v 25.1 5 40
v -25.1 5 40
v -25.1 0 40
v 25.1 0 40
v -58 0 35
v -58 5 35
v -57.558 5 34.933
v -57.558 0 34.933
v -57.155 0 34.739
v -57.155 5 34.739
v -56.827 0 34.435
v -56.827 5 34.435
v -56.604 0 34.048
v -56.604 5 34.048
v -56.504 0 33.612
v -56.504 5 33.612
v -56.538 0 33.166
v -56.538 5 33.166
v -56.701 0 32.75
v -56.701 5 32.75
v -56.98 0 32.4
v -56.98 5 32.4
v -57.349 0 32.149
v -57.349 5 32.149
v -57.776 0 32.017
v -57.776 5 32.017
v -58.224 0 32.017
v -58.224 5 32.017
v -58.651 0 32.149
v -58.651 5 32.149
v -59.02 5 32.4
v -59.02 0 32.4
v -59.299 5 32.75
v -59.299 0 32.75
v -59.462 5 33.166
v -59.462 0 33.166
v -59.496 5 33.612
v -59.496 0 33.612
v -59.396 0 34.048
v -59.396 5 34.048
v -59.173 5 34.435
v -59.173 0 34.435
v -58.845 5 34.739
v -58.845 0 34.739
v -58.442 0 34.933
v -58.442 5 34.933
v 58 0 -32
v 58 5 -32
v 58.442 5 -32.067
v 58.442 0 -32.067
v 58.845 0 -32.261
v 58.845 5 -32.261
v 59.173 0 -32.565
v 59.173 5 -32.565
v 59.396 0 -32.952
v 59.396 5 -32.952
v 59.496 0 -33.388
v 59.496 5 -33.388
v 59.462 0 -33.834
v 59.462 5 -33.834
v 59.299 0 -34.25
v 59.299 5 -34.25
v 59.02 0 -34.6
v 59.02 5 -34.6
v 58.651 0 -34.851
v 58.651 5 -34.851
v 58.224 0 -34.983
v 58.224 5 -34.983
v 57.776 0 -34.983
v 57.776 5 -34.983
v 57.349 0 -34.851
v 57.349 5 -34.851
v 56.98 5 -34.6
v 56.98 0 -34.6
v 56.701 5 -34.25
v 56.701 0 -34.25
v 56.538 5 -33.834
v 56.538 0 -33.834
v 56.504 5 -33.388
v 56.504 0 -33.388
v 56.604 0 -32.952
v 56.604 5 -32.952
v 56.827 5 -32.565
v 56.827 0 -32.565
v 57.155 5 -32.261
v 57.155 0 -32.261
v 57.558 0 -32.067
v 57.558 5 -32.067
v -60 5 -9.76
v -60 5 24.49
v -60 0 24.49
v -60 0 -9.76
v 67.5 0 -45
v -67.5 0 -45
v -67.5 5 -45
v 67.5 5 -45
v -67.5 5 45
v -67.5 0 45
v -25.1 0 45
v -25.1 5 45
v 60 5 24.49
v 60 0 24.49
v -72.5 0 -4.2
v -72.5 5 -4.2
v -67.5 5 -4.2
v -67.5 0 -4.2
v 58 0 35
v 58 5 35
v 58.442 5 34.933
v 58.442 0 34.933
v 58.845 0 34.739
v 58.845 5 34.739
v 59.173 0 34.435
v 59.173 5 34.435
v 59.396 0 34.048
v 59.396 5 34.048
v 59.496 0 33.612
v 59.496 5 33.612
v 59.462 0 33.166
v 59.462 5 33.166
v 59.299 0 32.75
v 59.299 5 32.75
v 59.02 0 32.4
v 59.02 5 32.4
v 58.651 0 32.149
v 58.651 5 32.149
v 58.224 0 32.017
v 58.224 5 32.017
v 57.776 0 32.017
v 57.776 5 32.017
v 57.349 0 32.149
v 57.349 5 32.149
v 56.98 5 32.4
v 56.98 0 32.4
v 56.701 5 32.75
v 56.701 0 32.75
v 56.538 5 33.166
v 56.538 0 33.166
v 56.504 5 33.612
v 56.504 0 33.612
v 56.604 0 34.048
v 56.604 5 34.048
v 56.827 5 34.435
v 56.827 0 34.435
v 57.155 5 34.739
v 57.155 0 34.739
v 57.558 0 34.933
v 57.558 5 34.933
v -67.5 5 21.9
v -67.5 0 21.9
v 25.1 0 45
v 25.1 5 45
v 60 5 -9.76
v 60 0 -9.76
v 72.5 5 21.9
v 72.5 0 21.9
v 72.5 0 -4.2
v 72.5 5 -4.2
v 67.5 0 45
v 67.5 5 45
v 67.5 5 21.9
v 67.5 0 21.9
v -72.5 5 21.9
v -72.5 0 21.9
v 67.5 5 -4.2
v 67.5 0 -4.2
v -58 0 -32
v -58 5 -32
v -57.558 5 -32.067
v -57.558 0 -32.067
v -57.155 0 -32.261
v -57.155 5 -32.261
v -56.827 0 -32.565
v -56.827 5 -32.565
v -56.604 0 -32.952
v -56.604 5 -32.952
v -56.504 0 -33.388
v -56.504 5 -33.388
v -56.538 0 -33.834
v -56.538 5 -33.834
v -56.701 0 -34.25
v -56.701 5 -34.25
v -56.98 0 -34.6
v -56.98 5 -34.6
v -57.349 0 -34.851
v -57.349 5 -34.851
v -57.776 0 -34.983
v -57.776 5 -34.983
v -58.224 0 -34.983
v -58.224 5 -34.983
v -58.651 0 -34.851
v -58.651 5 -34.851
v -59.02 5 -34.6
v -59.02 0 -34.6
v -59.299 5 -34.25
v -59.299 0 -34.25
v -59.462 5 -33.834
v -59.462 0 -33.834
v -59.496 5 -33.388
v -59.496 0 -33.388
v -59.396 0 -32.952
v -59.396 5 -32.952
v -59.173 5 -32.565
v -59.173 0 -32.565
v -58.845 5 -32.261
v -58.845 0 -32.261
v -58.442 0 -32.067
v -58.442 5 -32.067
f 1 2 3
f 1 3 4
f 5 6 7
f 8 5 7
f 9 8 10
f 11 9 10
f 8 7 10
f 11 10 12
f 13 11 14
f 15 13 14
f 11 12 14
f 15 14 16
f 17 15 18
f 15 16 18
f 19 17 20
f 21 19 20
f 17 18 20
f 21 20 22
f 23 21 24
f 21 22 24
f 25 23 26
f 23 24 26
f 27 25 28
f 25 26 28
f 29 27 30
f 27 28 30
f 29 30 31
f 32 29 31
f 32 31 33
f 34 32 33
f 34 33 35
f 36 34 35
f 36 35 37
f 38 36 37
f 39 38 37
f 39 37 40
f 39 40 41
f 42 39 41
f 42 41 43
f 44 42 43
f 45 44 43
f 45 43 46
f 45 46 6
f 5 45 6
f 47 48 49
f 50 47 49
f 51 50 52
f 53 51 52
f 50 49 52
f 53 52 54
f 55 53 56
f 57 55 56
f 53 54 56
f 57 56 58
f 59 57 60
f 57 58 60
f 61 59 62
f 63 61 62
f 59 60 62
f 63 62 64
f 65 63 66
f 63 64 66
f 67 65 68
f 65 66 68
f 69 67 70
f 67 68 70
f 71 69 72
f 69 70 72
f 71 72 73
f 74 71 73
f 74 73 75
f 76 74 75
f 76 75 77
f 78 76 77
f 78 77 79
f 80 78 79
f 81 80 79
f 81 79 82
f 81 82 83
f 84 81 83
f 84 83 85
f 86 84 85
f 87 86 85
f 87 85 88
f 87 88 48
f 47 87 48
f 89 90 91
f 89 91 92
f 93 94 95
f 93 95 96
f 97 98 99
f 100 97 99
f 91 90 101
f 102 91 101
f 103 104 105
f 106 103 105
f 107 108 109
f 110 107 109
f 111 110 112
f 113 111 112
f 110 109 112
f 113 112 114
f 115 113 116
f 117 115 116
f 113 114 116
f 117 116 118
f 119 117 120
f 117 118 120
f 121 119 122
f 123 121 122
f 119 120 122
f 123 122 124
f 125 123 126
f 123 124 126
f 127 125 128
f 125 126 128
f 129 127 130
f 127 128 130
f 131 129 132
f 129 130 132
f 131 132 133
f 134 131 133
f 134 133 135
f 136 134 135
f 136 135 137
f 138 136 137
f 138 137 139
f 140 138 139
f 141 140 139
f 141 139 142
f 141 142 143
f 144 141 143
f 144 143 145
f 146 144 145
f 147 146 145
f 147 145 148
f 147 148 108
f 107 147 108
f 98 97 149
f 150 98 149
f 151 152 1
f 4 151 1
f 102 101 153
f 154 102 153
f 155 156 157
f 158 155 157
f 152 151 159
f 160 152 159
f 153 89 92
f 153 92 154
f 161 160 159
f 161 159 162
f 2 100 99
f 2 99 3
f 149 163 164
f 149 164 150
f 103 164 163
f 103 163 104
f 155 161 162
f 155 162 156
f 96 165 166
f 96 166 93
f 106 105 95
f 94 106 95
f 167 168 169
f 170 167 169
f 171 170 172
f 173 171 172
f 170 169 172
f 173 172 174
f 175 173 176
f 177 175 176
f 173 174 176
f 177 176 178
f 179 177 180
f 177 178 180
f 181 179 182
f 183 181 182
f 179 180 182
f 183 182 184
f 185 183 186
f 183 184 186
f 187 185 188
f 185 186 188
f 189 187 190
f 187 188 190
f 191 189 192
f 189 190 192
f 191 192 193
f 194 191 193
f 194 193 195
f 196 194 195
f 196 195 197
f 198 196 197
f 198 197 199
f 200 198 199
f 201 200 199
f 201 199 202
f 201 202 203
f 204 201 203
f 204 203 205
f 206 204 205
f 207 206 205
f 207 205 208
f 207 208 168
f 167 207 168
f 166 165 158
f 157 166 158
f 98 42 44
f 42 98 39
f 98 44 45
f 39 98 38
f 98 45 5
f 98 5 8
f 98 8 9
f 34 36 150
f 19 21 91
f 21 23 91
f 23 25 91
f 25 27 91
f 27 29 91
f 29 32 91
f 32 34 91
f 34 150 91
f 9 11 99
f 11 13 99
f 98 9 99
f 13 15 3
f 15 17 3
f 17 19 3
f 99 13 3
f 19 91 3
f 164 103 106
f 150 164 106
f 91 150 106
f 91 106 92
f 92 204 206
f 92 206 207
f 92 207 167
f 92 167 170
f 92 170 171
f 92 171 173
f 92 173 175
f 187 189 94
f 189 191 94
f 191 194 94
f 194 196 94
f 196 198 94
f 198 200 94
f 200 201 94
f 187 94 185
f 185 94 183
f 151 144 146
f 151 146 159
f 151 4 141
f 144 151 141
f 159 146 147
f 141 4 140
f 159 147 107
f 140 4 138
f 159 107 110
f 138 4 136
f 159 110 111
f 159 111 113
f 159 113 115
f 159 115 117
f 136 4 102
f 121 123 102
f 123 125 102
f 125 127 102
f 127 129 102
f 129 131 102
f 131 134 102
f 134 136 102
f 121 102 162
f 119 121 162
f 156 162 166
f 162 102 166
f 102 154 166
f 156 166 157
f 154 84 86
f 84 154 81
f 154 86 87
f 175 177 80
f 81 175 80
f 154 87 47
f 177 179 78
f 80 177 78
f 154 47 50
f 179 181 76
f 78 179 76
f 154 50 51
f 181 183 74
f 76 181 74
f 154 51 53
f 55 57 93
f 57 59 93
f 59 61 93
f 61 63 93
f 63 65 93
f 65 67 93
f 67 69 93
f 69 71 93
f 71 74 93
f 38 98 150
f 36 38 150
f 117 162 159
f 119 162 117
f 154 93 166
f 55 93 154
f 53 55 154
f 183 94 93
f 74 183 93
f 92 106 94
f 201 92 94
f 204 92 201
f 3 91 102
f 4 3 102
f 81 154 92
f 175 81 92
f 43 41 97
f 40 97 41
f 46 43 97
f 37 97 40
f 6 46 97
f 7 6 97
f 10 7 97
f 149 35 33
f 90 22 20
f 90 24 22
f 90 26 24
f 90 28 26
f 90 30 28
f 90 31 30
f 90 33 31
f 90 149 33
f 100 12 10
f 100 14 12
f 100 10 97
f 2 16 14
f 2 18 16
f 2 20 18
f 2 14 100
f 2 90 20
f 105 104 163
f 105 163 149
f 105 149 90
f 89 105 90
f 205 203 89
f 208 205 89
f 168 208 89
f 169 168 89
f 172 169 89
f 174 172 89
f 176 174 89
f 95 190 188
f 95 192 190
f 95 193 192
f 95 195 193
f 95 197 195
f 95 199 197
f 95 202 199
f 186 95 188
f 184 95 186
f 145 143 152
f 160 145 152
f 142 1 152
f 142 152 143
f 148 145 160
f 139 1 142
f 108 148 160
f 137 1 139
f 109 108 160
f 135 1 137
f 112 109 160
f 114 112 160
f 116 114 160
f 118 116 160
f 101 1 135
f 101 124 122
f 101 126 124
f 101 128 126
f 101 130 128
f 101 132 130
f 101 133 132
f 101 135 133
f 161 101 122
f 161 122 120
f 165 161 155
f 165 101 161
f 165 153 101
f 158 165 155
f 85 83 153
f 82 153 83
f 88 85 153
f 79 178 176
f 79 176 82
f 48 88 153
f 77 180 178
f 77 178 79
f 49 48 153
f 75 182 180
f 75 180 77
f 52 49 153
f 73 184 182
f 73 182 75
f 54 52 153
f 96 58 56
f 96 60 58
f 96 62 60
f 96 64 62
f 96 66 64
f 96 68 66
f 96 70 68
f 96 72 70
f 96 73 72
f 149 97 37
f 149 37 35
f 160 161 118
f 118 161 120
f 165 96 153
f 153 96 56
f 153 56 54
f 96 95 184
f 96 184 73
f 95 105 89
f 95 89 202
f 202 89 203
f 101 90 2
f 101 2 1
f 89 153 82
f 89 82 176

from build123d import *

# Parameters (mm, degrees)
SKETCH1_W           = 145
SKETCH1_H           = 90
BOSS_EXTRUDE1_DEPTH = 5
SKETCH3_W           = 120
SKETCH3_H           = 34.25
CUT_EXTRUDE1_DEPTH  = 5
SKETCH4_W           = 5
SKETCH4_H           = 40.8
SKETCH4_H_2         = 23.1
CUT_EXTRUDE2_DEPTH  = 5
SKETCH7_W           = 50.2
SKETCH7_H           = 5
CUT_EXTRUDE3_DEPTH  = 5
SKETCH9_R           = 1.5
CUT_EXTRUDE4_DEPTH  = 10


with BuildPart() as part:
    # Sketch1 → Boss-Extrude1 (new body)
    with BuildSketch(Plane(origin=(0, 0, 0), x_dir=(1, 0, 0), z_dir=(0, 1, 0))):
        Rectangle(SKETCH1_W, SKETCH1_H)
    extrude(amount=BOSS_EXTRUDE1_DEPTH)

    # Sketch3 → Cut-Extrude1 (cut)
    with BuildSketch(Plane(origin=(0, 5, 0), x_dir=(1, 0, 0), z_dir=(0, 1, 0))):
        with Locations((0, -7.365)):
            Rectangle(SKETCH3_W, SKETCH3_H)
    extrude(amount=-CUT_EXTRUDE1_DEPTH, mode=Mode.SUBTRACT)

    # Sketch4 → Cut-Extrude2 (cut)
    with BuildSketch(Plane(origin=(0, 5, 0), x_dir=(1, 0, 0), z_dir=(0, 1, 0))):
        with Locations((-70, 24.6)):
            Rectangle(SKETCH4_W, SKETCH4_H)
        with Locations((-70, -33.45)):
            Rectangle(SKETCH4_W, SKETCH4_H_2)
        with Locations((70, -33.45)):
            Rectangle(SKETCH4_W, SKETCH4_H_2)
        with Locations((70, 24.6)):
            Rectangle(SKETCH4_W, SKETCH4_H)
    extrude(amount=-CUT_EXTRUDE2_DEPTH, mode=Mode.SUBTRACT)

    # Sketch7 → Cut-Extrude3 (cut)
    with BuildSketch(Plane(origin=(0, 5, 0), x_dir=(1, 0, 0), z_dir=(0, 1, 0))):
        with Locations((0, -42.5)):
            Rectangle(SKETCH7_W, SKETCH7_H)
    extrude(amount=-CUT_EXTRUDE3_DEPTH, mode=Mode.SUBTRACT)

    # Sketch9 → Cut-Extrude4 (cut)
    with BuildSketch(Plane(origin=(0, 5, 0), x_dir=(1, 0, 0), z_dir=(0, 1, 0))):
        with Locations(Location((-58, 33.5, 0), (0, 0, 270))):
            Circle(SKETCH9_R)
        with Locations(Location((58, 33.5, 0), (0, 0, 270))):
            Circle(SKETCH9_R)
        with Locations(Location((58, -33.5, 0), (0, 0, 270))):
            Circle(SKETCH9_R)
        with Locations(Location((-58, -33.5, 0), (0, 0, 270))):
            Circle(SKETCH9_R)
    extrude(amount=-CUT_EXTRUDE4_DEPTH, mode=Mode.SUBTRACT)


solid = part.part
